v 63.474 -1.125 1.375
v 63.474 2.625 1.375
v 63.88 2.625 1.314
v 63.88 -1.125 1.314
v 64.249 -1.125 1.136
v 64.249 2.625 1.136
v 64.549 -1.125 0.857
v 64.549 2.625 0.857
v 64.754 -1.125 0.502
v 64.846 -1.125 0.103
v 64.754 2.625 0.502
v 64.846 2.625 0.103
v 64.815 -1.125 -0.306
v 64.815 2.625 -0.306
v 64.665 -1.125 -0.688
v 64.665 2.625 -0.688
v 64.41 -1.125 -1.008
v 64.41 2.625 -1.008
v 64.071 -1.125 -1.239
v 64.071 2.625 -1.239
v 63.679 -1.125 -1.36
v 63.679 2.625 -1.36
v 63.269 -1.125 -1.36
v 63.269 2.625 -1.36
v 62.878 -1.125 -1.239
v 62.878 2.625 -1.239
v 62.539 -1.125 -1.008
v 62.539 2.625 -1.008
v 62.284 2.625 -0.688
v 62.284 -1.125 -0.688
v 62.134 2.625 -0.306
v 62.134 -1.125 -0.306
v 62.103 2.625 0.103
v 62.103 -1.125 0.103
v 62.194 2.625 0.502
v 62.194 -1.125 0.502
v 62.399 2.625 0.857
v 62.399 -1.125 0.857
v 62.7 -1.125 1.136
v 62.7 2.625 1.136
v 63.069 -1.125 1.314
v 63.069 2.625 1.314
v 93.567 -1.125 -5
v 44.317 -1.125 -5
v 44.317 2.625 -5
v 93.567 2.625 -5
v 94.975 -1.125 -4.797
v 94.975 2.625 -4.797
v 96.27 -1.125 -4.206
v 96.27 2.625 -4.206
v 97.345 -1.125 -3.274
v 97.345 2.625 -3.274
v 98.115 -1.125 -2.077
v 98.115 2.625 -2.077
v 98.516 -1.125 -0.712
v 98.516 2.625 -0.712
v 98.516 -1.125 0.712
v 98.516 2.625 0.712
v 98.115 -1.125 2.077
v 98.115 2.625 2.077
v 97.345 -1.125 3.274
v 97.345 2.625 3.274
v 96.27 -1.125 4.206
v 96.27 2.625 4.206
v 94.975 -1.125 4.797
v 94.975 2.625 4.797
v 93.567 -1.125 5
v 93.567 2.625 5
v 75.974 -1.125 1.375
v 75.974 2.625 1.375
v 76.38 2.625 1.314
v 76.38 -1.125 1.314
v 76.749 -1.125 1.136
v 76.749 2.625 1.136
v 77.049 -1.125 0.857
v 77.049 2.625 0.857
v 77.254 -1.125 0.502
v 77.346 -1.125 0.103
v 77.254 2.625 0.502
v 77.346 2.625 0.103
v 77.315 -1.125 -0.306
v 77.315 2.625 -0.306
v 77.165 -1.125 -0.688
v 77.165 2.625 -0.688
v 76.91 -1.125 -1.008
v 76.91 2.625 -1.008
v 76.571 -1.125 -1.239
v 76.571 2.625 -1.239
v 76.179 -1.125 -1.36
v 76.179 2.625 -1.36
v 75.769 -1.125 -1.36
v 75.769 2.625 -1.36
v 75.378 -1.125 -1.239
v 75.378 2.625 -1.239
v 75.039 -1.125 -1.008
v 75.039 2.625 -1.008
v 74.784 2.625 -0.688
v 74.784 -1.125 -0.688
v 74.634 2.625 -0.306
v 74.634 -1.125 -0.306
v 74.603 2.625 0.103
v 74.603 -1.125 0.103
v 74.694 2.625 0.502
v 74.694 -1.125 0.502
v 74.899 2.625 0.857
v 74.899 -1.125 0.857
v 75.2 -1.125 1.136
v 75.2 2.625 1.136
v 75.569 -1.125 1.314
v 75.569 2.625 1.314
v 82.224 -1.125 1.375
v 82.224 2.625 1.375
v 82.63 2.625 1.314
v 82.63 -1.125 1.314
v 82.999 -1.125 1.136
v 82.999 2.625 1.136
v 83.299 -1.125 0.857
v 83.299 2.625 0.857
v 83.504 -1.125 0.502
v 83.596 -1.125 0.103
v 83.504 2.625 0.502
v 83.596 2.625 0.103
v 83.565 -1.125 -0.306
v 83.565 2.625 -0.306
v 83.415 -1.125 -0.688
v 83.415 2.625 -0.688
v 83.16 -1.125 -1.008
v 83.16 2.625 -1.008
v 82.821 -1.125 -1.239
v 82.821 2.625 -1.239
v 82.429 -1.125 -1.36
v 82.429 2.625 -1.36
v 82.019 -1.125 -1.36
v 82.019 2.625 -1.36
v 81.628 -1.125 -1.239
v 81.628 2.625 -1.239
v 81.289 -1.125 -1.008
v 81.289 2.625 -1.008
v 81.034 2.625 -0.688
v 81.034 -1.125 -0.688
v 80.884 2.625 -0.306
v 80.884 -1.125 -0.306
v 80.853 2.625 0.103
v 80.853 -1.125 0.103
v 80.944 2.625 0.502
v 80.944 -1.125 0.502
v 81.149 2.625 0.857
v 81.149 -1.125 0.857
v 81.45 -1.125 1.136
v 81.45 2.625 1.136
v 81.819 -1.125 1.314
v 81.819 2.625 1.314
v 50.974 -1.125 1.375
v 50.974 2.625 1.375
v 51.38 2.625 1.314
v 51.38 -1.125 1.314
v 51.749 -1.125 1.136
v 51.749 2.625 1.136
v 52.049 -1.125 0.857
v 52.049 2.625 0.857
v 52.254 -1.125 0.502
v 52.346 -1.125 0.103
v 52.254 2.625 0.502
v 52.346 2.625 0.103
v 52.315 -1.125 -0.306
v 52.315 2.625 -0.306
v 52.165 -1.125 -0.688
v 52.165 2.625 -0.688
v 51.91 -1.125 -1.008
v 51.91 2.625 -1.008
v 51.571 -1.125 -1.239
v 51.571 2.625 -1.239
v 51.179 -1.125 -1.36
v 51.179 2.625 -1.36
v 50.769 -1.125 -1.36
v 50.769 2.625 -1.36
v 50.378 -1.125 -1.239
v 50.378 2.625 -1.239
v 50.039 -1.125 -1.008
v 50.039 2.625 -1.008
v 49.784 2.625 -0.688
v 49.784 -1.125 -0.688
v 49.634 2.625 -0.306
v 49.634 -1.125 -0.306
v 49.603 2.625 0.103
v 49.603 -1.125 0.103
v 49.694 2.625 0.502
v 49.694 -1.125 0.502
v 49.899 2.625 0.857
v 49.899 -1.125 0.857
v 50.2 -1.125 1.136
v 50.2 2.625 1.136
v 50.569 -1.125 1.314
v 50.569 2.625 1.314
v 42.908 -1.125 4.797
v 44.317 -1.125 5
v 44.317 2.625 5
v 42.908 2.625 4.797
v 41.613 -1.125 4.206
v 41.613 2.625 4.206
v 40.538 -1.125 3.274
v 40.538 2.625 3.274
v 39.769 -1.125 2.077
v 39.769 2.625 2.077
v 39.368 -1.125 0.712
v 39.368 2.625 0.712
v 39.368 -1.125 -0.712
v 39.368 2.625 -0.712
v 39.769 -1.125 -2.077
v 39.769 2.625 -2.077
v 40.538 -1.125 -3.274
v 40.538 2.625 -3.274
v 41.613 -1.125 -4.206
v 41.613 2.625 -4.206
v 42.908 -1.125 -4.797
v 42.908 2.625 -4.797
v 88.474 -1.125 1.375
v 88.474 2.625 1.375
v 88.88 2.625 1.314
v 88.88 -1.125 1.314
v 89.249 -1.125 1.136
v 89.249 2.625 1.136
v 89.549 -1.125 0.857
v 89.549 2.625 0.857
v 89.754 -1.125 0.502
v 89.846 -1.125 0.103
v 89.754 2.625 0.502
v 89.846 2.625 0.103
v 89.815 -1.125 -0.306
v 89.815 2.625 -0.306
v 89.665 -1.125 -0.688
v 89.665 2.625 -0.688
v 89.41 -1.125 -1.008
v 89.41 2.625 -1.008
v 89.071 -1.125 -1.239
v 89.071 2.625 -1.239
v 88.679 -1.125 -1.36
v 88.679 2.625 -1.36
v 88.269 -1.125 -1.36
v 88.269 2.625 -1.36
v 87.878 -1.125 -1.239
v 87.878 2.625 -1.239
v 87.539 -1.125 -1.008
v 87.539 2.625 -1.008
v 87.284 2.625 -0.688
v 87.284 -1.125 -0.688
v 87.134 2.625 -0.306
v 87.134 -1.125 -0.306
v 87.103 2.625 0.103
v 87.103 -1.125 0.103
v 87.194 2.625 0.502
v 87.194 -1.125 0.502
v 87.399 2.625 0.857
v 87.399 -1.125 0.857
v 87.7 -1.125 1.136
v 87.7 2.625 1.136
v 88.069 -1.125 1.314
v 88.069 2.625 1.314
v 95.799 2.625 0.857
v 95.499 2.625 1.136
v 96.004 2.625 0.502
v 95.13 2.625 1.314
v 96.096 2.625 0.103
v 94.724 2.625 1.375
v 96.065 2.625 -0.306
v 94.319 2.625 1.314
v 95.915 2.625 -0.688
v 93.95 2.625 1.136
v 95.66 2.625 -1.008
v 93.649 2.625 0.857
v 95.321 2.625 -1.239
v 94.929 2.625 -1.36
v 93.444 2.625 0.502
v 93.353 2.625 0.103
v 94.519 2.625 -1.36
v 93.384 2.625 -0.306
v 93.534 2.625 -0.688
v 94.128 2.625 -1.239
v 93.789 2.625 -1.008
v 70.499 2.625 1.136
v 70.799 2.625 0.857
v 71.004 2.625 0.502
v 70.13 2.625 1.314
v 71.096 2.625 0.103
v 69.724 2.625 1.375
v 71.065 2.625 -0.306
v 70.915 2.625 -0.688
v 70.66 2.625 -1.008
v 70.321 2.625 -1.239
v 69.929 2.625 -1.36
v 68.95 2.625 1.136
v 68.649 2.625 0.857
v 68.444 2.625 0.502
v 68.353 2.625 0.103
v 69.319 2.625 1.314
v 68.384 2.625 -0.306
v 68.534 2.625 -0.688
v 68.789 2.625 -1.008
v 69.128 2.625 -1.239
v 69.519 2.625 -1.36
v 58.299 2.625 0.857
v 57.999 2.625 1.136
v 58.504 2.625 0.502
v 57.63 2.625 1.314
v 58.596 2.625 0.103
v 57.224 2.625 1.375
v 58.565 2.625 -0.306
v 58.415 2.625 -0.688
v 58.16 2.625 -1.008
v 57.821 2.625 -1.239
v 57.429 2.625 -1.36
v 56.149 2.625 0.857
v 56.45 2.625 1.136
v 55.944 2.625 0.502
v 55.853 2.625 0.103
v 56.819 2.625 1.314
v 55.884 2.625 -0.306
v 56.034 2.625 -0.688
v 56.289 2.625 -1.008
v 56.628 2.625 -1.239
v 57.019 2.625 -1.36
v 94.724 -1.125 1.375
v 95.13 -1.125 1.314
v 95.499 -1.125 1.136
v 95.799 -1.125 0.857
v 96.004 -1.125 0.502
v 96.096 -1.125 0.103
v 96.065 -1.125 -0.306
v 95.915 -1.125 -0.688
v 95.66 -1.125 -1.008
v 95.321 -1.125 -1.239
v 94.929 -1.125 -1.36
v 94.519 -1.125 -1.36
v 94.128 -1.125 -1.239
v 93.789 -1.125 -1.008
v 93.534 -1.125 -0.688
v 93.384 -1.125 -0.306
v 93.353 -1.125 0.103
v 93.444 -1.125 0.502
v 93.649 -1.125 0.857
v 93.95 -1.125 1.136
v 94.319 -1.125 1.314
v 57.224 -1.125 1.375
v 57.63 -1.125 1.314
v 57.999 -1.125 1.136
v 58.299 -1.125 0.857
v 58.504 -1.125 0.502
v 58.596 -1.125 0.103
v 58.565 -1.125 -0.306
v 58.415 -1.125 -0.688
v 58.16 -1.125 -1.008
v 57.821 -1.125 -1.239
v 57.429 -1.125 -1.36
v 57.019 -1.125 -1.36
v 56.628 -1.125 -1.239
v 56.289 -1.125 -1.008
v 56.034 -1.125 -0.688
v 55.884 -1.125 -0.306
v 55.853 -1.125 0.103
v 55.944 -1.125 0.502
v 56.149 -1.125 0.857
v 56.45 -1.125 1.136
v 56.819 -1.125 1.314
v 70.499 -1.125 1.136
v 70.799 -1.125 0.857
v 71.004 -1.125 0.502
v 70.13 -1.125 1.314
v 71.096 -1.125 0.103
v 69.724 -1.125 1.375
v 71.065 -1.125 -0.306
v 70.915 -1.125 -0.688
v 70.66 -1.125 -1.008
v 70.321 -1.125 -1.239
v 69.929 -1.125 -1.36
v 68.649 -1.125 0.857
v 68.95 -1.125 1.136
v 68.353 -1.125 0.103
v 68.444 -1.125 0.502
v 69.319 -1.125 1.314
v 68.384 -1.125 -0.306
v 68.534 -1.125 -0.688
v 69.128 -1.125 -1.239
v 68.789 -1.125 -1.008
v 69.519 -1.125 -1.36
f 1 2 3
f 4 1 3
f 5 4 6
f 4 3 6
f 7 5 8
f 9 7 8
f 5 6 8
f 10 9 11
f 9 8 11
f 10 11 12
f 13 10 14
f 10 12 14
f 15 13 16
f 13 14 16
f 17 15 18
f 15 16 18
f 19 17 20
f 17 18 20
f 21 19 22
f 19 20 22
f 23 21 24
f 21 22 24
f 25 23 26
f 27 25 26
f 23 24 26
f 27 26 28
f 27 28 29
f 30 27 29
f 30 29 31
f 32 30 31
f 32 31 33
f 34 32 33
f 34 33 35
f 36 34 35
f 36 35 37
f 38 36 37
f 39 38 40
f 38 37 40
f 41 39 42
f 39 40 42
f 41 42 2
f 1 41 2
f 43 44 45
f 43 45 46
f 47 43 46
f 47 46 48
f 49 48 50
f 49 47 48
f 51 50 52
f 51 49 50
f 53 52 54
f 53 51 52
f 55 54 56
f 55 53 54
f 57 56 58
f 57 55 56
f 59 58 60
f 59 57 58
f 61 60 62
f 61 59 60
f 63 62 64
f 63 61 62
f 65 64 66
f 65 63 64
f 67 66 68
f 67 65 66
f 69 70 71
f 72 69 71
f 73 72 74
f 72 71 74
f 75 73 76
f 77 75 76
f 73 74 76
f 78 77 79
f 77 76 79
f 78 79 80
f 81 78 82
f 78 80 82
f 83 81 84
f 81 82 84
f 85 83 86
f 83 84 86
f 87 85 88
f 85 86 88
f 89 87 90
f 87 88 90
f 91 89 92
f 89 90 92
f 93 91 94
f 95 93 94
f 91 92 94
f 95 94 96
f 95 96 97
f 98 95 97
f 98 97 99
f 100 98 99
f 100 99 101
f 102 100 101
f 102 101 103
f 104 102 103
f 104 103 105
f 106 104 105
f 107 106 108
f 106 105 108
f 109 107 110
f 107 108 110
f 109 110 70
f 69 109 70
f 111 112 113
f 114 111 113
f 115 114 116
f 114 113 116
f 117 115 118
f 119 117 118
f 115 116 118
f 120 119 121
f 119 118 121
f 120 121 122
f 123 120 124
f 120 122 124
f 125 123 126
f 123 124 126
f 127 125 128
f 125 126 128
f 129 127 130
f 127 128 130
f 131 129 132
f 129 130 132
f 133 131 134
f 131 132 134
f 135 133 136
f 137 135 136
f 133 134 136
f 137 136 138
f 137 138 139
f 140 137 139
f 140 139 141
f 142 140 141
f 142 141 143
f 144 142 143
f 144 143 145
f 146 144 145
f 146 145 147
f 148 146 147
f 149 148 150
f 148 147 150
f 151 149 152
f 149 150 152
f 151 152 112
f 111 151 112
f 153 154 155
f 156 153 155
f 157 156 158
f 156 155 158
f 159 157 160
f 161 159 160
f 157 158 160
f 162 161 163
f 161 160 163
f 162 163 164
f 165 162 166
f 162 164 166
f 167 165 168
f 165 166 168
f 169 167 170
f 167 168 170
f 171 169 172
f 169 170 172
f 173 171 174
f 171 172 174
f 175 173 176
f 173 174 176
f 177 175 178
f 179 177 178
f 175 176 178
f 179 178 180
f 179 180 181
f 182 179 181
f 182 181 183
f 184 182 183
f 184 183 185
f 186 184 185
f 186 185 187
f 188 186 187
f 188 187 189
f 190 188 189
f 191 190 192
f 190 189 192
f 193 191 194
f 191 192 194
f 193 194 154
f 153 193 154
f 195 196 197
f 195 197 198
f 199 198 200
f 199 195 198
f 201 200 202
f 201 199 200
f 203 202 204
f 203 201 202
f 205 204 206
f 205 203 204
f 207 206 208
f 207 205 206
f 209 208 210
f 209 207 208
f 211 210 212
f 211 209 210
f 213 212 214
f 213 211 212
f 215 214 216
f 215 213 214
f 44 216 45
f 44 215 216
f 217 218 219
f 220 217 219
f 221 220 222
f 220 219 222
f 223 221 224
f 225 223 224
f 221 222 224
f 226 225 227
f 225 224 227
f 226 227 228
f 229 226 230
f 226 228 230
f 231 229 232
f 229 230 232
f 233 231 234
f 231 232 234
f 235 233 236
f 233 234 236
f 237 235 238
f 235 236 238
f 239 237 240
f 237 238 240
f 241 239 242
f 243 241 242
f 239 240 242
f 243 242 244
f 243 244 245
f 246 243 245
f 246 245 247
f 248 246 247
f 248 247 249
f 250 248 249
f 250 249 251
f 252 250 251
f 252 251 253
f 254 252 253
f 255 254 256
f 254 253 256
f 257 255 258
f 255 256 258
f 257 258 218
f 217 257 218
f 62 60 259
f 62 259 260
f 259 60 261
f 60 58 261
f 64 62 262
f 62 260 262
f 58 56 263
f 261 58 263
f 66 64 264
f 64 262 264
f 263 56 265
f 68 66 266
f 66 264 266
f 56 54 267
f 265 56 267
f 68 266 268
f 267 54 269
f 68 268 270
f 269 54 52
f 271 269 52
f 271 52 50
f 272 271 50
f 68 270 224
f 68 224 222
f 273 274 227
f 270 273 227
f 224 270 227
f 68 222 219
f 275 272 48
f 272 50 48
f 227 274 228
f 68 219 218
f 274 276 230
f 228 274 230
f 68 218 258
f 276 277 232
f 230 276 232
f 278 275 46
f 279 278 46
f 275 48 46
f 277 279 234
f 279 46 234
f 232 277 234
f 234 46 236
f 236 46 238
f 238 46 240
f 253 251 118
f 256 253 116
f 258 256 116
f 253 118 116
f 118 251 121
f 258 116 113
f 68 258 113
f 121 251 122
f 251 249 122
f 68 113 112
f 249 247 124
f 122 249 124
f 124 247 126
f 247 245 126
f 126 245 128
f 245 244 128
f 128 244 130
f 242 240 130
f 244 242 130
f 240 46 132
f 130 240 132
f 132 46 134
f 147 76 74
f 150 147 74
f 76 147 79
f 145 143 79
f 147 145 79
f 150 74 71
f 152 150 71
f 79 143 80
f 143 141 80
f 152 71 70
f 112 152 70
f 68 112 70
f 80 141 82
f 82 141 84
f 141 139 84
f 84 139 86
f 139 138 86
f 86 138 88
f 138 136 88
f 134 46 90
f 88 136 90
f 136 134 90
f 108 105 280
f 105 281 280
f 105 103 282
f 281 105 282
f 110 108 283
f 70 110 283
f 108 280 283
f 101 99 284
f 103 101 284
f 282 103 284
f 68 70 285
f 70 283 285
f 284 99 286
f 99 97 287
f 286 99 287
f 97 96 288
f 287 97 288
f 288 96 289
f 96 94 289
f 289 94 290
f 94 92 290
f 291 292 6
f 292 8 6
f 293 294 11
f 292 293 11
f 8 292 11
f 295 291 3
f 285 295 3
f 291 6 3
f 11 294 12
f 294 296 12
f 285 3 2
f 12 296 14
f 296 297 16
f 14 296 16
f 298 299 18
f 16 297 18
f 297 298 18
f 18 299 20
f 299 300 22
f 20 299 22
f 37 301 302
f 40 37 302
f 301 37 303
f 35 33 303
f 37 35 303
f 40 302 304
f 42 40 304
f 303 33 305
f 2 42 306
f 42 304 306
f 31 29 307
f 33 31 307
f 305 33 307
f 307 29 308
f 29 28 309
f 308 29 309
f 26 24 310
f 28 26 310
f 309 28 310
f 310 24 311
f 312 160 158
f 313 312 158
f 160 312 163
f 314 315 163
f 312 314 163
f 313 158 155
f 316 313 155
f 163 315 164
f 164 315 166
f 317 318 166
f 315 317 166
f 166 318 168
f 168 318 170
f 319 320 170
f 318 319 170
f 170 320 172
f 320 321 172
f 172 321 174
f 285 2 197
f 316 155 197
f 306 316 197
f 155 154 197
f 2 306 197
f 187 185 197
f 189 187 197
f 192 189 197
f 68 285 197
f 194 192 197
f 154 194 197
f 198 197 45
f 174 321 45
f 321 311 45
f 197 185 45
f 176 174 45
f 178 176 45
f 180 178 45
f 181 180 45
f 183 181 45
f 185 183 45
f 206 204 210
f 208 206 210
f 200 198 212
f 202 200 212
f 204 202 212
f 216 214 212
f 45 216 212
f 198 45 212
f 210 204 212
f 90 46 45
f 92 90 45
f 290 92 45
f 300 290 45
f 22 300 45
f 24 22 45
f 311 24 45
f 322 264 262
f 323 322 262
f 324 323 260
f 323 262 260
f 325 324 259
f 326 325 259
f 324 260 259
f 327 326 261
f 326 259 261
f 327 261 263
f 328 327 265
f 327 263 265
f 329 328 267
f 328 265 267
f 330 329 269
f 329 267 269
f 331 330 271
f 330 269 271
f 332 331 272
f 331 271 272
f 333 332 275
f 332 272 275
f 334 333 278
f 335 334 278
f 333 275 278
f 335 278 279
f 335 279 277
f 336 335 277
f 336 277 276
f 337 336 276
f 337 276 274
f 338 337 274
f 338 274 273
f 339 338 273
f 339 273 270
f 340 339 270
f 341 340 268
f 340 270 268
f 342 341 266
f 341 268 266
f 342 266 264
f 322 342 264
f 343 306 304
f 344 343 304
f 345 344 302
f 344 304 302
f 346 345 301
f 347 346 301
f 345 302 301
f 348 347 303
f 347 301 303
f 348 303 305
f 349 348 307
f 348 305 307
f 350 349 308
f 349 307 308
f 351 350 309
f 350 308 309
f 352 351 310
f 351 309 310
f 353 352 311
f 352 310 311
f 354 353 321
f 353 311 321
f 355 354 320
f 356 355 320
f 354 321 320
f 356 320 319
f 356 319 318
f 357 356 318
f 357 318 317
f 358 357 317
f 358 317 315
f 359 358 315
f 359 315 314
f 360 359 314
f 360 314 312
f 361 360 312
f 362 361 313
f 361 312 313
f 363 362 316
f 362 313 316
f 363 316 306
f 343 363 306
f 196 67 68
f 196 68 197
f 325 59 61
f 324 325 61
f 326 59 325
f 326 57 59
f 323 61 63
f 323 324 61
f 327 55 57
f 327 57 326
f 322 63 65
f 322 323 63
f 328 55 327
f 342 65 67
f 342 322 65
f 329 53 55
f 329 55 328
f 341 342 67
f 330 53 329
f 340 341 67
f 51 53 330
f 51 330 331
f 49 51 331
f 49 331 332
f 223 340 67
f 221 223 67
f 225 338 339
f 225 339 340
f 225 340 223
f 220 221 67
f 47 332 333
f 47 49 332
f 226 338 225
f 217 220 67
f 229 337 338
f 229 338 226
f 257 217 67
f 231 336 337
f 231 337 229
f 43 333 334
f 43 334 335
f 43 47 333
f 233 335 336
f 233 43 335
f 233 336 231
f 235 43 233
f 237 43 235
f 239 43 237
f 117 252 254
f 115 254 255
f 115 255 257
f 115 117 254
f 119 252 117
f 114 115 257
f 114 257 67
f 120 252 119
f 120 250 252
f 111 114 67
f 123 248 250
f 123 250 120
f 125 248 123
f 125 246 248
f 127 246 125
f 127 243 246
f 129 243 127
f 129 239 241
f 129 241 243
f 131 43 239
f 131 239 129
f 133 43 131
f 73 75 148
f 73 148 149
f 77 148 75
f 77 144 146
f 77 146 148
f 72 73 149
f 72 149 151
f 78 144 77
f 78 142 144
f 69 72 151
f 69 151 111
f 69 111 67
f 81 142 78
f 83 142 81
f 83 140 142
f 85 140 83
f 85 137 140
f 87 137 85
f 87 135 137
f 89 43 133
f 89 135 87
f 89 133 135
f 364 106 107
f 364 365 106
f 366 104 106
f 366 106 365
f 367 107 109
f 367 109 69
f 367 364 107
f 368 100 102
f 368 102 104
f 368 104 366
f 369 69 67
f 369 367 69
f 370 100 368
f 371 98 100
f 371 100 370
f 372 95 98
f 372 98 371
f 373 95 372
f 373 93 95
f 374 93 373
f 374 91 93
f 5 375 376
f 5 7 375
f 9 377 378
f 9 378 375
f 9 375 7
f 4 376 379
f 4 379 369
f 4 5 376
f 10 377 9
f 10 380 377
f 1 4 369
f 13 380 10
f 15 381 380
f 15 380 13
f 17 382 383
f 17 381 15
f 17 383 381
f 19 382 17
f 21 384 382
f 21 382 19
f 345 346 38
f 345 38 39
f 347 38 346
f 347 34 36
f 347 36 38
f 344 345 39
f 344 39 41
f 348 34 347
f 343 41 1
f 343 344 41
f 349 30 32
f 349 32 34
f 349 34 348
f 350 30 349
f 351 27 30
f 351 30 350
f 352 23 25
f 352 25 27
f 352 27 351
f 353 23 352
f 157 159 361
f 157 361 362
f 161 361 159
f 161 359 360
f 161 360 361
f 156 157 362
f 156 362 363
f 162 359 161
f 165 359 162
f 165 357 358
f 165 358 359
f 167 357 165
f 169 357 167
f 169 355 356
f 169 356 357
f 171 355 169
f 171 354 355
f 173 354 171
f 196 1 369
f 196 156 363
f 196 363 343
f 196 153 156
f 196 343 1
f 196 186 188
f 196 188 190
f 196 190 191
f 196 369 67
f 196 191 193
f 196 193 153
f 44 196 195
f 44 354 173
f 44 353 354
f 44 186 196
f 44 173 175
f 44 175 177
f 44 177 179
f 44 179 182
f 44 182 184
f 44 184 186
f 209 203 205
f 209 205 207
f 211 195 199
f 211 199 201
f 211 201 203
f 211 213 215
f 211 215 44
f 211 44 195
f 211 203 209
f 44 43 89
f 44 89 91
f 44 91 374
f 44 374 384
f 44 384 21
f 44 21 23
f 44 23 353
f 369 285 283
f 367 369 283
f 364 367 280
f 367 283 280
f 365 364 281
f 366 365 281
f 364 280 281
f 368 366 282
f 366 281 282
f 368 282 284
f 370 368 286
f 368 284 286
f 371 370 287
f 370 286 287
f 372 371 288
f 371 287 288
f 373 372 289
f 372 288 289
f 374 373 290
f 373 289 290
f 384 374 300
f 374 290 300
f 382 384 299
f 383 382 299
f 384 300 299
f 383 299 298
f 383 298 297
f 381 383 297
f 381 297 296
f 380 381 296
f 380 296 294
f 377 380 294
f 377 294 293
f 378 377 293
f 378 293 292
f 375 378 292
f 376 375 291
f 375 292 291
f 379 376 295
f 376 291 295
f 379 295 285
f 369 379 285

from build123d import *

# Parameters (mm, degrees)
BOSS_EXTRUDE1_DEPTH = 1.5
SKETCH2_R           = 0.55
CUT_EXTRUDE1_DEPTH  = 1.5
SCALE1_SCALE        = 2.5


with BuildPart() as part:
    # Sketch1 → Boss-Extrude1 (new body)
    with BuildSketch(Plane(origin=(0, 0, 0), x_dir=(1, 0, 0), z_dir=(0, 1, 0))):
        with BuildLine():
            Line((58.878887557, 2), (78.578887557, 2))
            ThreePointArc((78.578887557, 2), (80.578887557, 0), (78.578887557, -2))
            Line((78.578887557, -2), (58.878887557, -2))
            ThreePointArc((58.878887557, -2), (56.878887557, 0), (58.878887557, 2))
        make_face()
    extrude(amount=BOSS_EXTRUDE1_DEPTH)

    # Sketch2 → Cut-Extrude1 (cut)
    with BuildSketch(Plane(origin=(0, 1.5, 0), x_dir=(1, 0, 0), z_dir=(0, 1, 0))):
        with Locations(Location((79.041953668, 0, 0), (0, 0, 270))):
            Circle(SKETCH2_R)
        with Locations(Location((76.541953668, 0, 0), (0, 0, 270))):
            Circle(SKETCH2_R)
        with Locations(Location((74.041953668, 0, 0), (0, 0, 270))):
            Circle(SKETCH2_R)
        with Locations(Location((71.541953668, 0, 0), (0, 0, 270))):
            Circle(SKETCH2_R)
        with Locations(Location((69.041953668, 0, 0), (0, 0, 270))):
            Circle(SKETCH2_R)
        with Locations(Location((66.541953668, 0, 0), (0, 0, 270))):
            Circle(SKETCH2_R)
        with Locations(Location((64.041953668, 0, 0), (0, 0, 270))):
            Circle(SKETCH2_R)
        with Locations(Location((61.541953668, 0, 0), (0, 0, 270))):
            Circle(SKETCH2_R)
    extrude(amount=-CUT_EXTRUDE1_DEPTH, mode=Mode.SUBTRACT)


with BuildPart() as part_1:
    # Scale1: scaled about (68.587018838, 0.75, 0)
    add(part.part.scale(SCALE1_SCALE).moved(Location((-102.880528257, -1.125, 0))))


solid = part_1.part
